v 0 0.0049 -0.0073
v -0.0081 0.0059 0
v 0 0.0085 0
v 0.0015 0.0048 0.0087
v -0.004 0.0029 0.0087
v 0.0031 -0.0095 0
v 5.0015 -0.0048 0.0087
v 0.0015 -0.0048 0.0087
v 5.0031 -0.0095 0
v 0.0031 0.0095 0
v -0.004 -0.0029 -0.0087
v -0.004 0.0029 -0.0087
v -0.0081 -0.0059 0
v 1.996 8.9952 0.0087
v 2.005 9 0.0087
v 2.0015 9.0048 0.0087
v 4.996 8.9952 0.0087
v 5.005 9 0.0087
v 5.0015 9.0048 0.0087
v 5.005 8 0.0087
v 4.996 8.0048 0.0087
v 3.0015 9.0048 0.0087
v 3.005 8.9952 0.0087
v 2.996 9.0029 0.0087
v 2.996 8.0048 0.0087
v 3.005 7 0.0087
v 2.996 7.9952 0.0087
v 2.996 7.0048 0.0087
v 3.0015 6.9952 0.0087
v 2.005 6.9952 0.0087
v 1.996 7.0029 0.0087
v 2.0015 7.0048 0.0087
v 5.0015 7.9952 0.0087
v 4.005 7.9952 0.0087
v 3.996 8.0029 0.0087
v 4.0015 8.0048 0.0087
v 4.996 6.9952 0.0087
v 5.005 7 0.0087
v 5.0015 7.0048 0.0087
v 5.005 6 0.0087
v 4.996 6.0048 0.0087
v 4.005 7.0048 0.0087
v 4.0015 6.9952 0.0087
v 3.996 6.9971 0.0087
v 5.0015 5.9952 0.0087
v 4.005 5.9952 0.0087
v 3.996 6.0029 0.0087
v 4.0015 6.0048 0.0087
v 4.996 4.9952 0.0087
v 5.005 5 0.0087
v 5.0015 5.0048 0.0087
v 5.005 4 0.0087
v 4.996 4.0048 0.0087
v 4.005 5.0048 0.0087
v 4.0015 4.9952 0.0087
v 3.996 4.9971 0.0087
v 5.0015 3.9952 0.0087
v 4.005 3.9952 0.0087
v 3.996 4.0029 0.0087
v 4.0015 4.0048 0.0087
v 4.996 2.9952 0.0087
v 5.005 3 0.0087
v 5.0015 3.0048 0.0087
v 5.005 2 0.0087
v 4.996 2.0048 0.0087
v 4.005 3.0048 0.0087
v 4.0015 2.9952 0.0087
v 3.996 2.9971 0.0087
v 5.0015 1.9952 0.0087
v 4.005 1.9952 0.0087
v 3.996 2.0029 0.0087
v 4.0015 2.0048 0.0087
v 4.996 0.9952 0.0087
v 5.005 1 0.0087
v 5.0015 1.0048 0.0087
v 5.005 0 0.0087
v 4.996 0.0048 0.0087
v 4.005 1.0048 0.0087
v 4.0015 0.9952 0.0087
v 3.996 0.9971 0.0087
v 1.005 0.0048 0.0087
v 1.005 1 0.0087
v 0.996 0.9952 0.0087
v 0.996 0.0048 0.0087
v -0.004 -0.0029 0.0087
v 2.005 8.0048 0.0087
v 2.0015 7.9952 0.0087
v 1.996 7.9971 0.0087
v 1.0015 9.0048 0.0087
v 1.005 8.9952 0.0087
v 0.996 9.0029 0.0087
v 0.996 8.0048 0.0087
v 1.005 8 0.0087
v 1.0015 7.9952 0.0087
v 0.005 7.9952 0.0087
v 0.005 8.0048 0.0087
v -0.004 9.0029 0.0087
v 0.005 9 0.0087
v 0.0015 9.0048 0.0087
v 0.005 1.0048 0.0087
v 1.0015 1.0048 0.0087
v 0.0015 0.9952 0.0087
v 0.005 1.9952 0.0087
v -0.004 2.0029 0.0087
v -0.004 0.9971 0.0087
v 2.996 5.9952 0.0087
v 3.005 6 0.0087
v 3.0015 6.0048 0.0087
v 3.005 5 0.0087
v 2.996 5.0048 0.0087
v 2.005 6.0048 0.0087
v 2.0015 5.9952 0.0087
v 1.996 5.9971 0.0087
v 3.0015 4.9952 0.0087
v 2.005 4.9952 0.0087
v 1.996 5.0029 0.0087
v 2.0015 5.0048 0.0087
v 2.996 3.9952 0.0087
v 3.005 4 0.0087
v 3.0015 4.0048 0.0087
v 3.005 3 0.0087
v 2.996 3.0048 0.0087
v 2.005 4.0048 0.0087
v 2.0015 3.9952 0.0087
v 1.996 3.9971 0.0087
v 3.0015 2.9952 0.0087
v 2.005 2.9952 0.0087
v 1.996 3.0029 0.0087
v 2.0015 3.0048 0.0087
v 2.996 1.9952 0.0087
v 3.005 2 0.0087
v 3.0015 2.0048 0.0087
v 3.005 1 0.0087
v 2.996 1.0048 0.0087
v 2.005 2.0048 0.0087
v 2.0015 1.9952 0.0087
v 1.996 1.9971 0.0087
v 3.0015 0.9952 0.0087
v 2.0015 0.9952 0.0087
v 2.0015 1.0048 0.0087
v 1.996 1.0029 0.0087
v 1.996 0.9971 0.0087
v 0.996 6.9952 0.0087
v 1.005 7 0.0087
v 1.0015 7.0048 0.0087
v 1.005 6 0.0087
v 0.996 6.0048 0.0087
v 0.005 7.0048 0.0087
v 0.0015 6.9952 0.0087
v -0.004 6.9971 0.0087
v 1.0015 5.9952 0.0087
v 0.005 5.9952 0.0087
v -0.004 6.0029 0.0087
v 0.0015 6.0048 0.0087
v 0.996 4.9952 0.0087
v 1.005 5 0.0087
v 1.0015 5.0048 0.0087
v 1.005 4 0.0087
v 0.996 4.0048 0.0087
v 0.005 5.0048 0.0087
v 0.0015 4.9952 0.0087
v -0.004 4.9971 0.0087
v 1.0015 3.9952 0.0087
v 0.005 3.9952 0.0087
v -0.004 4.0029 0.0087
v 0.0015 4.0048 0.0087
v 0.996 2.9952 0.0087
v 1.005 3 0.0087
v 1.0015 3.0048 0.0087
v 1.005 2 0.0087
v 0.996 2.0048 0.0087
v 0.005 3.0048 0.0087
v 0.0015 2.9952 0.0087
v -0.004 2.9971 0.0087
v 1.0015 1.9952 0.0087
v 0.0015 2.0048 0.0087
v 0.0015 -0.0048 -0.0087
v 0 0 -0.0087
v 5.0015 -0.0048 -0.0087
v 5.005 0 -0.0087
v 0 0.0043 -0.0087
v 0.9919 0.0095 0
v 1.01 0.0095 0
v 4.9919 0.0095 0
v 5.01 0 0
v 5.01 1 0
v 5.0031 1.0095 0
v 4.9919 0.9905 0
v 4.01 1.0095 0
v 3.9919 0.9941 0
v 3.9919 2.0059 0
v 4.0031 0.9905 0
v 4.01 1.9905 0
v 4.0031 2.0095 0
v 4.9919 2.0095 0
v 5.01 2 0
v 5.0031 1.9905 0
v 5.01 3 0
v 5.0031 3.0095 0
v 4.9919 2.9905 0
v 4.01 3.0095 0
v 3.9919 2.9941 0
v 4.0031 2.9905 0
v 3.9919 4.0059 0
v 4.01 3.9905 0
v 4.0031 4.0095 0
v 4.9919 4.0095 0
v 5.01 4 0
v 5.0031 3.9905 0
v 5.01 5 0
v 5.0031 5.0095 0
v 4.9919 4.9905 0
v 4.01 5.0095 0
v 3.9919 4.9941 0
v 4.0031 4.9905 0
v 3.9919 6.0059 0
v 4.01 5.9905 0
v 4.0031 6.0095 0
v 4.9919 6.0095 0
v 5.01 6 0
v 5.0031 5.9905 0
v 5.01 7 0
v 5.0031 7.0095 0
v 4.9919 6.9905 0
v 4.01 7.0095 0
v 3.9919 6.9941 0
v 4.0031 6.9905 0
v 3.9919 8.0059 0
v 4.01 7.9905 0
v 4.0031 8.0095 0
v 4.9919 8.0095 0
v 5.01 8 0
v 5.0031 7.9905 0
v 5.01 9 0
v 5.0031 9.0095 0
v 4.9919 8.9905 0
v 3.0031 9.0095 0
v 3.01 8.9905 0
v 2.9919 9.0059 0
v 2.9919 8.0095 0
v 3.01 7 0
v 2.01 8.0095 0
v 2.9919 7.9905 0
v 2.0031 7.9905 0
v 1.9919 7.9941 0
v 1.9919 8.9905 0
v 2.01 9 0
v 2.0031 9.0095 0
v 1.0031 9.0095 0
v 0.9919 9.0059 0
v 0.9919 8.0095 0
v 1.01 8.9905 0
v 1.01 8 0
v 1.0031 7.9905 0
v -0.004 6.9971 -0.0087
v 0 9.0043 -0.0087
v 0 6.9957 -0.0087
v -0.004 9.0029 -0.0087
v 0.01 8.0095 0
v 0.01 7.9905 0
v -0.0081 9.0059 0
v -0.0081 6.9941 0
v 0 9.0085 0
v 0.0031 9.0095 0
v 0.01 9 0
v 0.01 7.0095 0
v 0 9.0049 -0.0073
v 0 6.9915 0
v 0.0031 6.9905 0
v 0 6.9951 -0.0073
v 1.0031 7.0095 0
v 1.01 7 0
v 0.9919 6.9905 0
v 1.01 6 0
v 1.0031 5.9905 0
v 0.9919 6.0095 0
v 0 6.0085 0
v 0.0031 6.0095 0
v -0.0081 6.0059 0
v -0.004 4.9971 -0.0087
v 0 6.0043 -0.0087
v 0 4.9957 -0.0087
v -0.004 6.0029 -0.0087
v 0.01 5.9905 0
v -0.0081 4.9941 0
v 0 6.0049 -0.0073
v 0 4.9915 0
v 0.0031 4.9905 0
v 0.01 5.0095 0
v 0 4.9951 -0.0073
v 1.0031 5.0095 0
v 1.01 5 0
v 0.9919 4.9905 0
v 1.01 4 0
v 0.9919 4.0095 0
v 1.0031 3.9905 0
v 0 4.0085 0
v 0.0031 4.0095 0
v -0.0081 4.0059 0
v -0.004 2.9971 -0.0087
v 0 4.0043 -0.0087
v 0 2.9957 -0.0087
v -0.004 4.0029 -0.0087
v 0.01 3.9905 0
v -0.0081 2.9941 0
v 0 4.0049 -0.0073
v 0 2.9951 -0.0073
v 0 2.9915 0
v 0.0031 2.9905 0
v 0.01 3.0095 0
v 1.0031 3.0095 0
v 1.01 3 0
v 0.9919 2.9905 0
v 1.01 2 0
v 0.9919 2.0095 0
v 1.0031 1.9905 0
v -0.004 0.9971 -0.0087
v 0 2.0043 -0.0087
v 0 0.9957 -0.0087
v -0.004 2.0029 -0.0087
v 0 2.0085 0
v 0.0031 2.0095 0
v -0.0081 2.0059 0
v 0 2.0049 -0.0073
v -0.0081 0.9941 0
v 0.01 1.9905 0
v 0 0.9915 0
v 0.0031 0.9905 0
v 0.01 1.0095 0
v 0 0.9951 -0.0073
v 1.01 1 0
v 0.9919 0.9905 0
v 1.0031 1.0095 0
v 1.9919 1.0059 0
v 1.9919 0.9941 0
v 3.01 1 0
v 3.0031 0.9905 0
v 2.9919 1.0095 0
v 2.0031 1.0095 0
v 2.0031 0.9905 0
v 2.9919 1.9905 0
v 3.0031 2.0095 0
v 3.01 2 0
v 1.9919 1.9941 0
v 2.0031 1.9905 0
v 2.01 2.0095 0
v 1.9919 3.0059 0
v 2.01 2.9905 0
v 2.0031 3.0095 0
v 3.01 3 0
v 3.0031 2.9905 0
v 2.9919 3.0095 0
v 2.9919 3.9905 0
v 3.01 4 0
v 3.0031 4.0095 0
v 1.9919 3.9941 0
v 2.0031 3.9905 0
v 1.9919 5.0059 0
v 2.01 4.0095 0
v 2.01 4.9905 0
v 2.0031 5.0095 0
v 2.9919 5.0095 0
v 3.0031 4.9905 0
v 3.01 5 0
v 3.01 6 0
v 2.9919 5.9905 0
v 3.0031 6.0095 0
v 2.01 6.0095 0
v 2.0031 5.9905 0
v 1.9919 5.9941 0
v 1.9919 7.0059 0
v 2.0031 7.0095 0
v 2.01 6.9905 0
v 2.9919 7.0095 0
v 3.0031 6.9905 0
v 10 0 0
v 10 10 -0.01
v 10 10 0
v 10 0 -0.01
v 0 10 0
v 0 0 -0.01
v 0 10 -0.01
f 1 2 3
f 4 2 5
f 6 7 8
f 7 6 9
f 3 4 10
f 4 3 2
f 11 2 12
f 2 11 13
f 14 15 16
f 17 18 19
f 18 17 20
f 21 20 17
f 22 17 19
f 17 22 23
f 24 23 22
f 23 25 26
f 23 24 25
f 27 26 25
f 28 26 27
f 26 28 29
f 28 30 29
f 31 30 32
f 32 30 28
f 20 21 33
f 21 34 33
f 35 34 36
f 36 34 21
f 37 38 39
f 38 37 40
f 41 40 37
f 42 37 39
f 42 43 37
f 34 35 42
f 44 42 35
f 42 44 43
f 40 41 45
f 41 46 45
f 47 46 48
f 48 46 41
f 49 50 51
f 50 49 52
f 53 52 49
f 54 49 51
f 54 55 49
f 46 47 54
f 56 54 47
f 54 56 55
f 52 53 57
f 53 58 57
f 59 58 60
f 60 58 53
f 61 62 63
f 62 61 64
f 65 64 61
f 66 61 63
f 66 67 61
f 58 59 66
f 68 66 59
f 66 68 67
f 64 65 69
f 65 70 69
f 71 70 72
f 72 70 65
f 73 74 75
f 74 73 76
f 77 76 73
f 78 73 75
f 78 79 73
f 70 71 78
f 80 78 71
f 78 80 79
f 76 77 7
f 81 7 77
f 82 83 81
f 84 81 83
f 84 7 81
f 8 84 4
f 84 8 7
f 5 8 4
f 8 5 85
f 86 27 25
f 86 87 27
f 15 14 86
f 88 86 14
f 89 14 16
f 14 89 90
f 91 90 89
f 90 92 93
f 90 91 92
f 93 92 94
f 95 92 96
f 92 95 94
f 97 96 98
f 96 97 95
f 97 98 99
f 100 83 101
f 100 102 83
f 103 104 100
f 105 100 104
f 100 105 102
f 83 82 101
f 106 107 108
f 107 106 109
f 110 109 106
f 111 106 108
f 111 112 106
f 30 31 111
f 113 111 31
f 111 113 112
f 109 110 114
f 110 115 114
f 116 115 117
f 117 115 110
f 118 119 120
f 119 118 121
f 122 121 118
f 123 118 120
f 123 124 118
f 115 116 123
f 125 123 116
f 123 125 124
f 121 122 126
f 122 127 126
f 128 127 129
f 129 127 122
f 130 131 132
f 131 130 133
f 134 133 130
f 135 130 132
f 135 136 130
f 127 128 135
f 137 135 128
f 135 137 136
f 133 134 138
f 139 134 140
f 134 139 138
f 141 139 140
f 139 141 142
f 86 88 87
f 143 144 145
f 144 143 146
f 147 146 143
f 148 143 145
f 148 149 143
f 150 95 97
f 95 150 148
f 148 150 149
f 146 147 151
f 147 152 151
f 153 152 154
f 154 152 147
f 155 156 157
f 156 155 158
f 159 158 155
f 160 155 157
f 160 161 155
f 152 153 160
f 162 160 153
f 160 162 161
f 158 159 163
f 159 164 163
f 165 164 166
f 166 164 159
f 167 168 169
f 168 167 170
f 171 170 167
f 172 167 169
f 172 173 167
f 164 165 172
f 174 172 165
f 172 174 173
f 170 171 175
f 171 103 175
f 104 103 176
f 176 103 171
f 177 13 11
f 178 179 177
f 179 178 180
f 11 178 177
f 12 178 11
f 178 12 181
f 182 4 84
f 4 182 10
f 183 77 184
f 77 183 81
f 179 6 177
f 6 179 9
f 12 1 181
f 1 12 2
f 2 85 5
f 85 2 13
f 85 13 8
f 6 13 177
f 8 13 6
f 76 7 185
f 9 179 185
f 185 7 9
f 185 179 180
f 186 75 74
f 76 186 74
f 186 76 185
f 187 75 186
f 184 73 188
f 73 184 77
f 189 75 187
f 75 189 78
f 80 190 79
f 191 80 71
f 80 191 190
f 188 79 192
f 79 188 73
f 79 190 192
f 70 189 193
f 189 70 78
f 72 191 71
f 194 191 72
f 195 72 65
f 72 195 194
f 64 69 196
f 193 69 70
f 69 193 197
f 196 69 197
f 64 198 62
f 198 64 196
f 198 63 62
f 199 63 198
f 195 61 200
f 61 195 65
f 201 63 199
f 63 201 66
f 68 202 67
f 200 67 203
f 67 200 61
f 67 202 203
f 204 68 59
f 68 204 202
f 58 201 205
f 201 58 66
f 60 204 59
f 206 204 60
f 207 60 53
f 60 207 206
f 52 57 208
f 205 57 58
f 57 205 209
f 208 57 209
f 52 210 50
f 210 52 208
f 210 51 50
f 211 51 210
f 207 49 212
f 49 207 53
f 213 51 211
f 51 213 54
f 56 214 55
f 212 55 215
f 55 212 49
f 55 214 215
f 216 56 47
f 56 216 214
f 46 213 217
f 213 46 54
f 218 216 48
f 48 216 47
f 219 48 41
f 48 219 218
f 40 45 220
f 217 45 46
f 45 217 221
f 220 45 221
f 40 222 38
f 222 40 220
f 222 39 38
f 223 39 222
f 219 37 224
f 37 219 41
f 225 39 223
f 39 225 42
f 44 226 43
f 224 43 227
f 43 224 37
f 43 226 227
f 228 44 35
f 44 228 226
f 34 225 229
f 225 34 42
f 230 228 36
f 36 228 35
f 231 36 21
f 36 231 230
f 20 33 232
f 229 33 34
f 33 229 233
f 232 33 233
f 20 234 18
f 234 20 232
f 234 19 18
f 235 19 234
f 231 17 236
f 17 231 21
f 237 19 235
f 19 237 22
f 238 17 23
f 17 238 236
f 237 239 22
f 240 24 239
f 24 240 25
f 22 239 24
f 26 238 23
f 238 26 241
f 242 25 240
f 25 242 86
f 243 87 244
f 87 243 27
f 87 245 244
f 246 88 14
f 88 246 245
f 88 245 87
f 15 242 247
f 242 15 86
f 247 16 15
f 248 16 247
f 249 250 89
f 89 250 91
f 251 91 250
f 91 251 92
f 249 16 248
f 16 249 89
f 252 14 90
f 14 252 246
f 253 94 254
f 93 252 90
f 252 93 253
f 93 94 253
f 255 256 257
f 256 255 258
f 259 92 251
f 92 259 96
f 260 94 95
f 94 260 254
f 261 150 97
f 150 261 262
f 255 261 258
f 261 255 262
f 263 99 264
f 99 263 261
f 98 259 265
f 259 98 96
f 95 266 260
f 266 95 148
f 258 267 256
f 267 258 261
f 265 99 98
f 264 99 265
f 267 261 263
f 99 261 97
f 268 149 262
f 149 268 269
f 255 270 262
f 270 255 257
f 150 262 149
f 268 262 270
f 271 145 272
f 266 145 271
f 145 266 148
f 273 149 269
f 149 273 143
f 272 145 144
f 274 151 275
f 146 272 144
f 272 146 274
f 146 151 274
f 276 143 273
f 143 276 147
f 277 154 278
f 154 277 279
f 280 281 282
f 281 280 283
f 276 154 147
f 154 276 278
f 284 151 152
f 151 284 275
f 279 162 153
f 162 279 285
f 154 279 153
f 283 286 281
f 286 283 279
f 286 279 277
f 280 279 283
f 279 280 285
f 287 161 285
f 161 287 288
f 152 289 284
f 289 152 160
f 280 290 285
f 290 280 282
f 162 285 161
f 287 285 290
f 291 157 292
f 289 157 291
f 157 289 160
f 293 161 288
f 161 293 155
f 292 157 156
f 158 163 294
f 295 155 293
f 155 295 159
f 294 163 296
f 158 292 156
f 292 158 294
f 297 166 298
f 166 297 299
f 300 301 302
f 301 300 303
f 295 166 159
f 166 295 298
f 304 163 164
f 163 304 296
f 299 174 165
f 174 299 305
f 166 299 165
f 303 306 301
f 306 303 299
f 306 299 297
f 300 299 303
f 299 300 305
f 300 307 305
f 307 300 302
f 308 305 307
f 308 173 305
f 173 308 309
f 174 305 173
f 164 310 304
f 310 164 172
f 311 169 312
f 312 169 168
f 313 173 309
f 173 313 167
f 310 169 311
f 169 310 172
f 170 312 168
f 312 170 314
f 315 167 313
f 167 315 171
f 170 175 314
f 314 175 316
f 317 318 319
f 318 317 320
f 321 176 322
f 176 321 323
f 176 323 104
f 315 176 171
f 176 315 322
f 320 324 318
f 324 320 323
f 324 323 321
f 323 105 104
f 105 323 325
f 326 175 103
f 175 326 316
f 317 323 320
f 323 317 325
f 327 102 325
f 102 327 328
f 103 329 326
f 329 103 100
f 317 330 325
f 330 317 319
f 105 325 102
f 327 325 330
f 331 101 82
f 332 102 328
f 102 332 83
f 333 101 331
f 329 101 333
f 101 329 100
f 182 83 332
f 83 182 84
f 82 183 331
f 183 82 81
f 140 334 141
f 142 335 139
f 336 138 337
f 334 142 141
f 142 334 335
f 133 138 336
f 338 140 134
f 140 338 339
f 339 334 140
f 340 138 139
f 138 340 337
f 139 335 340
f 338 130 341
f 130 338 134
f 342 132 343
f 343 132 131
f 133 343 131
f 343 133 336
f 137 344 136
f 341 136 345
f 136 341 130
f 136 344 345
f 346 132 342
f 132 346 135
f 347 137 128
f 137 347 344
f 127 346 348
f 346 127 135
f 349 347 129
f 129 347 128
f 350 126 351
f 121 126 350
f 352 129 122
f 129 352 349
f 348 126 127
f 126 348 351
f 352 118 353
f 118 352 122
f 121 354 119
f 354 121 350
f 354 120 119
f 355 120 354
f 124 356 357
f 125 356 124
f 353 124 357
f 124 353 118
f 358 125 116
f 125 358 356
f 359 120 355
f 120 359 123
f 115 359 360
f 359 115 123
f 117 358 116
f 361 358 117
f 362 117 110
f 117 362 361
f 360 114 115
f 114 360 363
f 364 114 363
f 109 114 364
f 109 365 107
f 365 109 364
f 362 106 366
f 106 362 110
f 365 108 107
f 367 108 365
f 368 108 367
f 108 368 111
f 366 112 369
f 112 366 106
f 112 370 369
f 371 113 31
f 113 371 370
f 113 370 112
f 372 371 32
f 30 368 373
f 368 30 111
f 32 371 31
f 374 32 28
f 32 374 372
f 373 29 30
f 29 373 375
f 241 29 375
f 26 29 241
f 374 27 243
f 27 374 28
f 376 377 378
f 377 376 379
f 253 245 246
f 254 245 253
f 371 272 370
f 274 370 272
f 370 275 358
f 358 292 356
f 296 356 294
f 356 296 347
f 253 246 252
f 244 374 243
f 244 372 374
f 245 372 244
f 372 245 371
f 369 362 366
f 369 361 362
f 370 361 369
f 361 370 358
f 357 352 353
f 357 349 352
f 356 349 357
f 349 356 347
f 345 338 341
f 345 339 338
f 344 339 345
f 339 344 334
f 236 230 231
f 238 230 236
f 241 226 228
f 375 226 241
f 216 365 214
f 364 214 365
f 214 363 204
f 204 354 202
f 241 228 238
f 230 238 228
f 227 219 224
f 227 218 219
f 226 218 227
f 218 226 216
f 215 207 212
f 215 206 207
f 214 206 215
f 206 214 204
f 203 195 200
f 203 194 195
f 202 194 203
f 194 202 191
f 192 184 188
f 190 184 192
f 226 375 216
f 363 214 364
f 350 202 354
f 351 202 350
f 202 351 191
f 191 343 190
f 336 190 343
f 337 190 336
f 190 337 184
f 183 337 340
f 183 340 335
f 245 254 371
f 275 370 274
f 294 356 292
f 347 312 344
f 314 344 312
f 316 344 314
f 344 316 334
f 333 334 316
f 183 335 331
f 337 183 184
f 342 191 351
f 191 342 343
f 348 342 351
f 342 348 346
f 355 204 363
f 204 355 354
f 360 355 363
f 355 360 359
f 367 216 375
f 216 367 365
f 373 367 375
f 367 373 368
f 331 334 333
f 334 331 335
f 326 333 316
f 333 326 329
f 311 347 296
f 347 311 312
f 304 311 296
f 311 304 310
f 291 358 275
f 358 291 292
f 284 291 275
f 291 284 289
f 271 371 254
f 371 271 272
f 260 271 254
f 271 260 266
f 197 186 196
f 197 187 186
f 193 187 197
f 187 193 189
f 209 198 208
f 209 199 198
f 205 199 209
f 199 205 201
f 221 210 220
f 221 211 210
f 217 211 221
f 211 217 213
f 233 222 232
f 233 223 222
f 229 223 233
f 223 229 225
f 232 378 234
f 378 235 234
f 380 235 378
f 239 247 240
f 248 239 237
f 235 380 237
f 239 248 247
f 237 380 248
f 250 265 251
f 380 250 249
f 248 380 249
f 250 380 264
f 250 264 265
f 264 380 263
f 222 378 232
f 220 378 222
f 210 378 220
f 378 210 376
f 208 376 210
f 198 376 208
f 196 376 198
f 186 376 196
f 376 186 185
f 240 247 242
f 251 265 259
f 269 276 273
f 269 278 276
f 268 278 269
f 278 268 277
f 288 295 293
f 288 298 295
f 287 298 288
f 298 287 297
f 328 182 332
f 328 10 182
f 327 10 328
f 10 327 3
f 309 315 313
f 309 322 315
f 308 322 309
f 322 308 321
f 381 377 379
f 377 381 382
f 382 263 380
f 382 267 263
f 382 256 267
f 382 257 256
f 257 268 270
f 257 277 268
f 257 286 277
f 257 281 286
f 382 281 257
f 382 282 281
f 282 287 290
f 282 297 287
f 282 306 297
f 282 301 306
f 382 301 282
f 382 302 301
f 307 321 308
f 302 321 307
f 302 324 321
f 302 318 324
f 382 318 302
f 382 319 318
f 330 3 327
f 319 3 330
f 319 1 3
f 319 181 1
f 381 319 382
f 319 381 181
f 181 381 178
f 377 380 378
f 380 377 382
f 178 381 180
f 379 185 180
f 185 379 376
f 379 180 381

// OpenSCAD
hull(){
    translate([0, 0]) sphere(0.01);
    translate([1, 0]) sphere(0.01);
}
hull(){
    translate([1, 0]) sphere(0.01);
    translate([2, 0]) sphere(0.01);
}
hull(){
    translate([2, 0]) sphere(0.01);
    translate([3, 0]) sphere(0.01);
}
hull(){
    translate([3, 0]) sphere(0.01);
    translate([4, 0]) sphere(0.01);
}
hull(){
    translate([4, 0]) sphere(0.01);
    translate([5, 0]) sphere(0.01);
}
hull(){
    translate([5, 0]) sphere(0.01);
    translate([5, 1]) sphere(0.01);
}
hull(){
    translate([5, 1]) sphere(0.01);
    translate([4, 1]) sphere(0.01);
}
hull(){
    translate([4, 1]) sphere(0.01);
    translate([4, 2]) sphere(0.01);
}
hull(){
    translate([4, 2]) sphere(0.01);
    translate([5, 2]) sphere(0.01);
}
hull(){
    translate([5, 2]) sphere(0.01);
    translate([5, 3]) sphere(0.01);
}
hull(){
    translate([5, 3]) sphere(0.01);
    translate([4, 3]) sphere(0.01);
}
hull(){
    translate([4, 3]) sphere(0.01);
    translate([4, 4]) sphere(0.01);
}
hull(){
    translate([4, 4]) sphere(0.01);
    translate([5, 4]) sphere(0.01);
}
hull(){
    translate([5, 4]) sphere(0.01);
    translate([5, 5]) sphere(0.01);
}
hull(){
    translate([5, 5]) sphere(0.01);
    translate([4, 5]) sphere(0.01);
}
hull(){
    translate([4, 5]) sphere(0.01);
    translate([4, 6]) sphere(0.01);
}
hull(){
    translate([4, 6]) sphere(0.01);
    translate([5, 6]) sphere(0.01);
}
hull(){
    translate([5, 6]) sphere(0.01);
    translate([5, 7]) sphere(0.01);
}
hull(){
    translate([5, 7]) sphere(0.01);
    translate([4, 7]) sphere(0.01);
}
hull(){
    translate([4, 7]) sphere(0.01);
    translate([4, 8]) sphere(0.01);
}
hull(){
    translate([4, 8]) sphere(0.01);
    translate([5, 8]) sphere(0.01);
}
hull(){
    translate([5, 8]) sphere(0.01);
    translate([5, 9]) sphere(0.01);
}
hull(){
    translate([5, 9]) sphere(0.01);
    translate([4, 9]) sphere(0.01);
}
hull(){
    translate([4, 9]) sphere(0.01);
    translate([3, 9]) sphere(0.01);
}
hull(){
    translate([3, 9]) sphere(0.01);
    translate([3, 8]) sphere(0.01);
}
hull(){
    translate([3, 8]) sphere(0.01);
    translate([2, 8]) sphere(0.01);
}
hull(){
    translate([2, 8]) sphere(0.01);
    translate([2, 9]) sphere(0.01);
}
hull(){
    translate([2, 9]) sphere(0.01);
    translate([1, 9]) sphere(0.01);
}
hull(){
    translate([1, 9]) sphere(0.01);
    translate([1, 8]) sphere(0.01);
}
hull(){
    translate([1, 8]) sphere(0.01);
    translate([0, 8]) sphere(0.01);
}
hull(){
    translate([0, 8]) sphere(0.01);
    translate([0, 9]) sphere(0.01);
}
hull(){
    translate([0, 9]) sphere(0.01);
    translate([0, 8]) sphere(0.01);
}
hull(){
    translate([0, 8]) sphere(0.01);
    translate([0, 7]) sphere(0.01);
}
hull(){
    translate([0, 7]) sphere(0.01);
    translate([1, 7]) sphere(0.01);
}
hull(){
    translate([1, 7]) sphere(0.01);
    translate([1, 6]) sphere(0.01);
}
hull(){
    translate([1, 6]) sphere(0.01);
    translate([0, 6]) sphere(0.01);
}
hull(){
    translate([0, 6]) sphere(0.01);
    translate([0, 5]) sphere(0.01);
}
hull(){
    translate([0, 5]) sphere(0.01);
    translate([1, 5]) sphere(0.01);
}
hull(){
    translate([1, 5]) sphere(0.01);
    translate([1, 4]) sphere(0.01);
}
hull(){
    translate([1, 4]) sphere(0.01);
    translate([0, 4]) sphere(0.01);
}
hull(){
    translate([0, 4]) sphere(0.01);
    translate([0, 3]) sphere(0.01);
}
hull(){
    translate([0, 3]) sphere(0.01);
    translate([1, 3]) sphere(0.01);
}
hull(){
    translate([1, 3]) sphere(0.01);
    translate([1, 2]) sphere(0.01);
}
hull(){
    translate([1, 2]) sphere(0.01);
    translate([0, 2]) sphere(0.01);
}
hull(){
    translate([0, 2]) sphere(0.01);
    translate([0, 1]) sphere(0.01);
}
hull(){
    translate([0, 1]) sphere(0.01);
    translate([1, 1]) sphere(0.01);
}
hull(){
    translate([1, 1]) sphere(0.01);
    translate([1, 0]) sphere(0.01);
}
hull(){
    translate([1, 0]) sphere(0.01);
    translate([0, 0]) sphere(0.01);
}
hull(){
    translate([2, 1]) sphere(0.01);
    translate([3, 1]) sphere(0.01);
}
hull(){
    translate([3, 1]) sphere(0.01);
    translate([3, 2]) sphere(0.01);
}
hull(){
    translate([3, 2]) sphere(0.01);
    translate([2, 2]) sphere(0.01);
}
hull(){
    translate([2, 2]) sphere(0.01);
    translate([2, 3]) sphere(0.01);
}
hull(){
    translate([2, 3]) sphere(0.01);
    translate([3, 3]) sphere(0.01);
}
hull(){
    translate([3, 3]) sphere(0.01);
    translate([3, 4]) sphere(0.01);
}
hull(){
    translate([3, 4]) sphere(0.01);
    translate([2, 4]) sphere(0.01);
}
hull(){
    translate([2, 4]) sphere(0.01);
    translate([2, 5]) sphere(0.01);
}
hull(){
    translate([2, 5]) sphere(0.01);
    translate([3, 5]) sphere(0.01);
}
hull(){
    translate([3, 5]) sphere(0.01);
    translate([3, 6]) sphere(0.01);
}
hull(){
    translate([3, 6]) sphere(0.01);
    translate([2, 6]) sphere(0.01);
}
hull(){
    translate([2, 6]) sphere(0.01);
    translate([2, 7]) sphere(0.01);
}
hull(){
    translate([2, 7]) sphere(0.01);
    translate([3, 7]) sphere(0.01);
}
hull(){
    translate([3, 7]) sphere(0.01);
    translate([3, 8]) sphere(0.01);
}
translate([0,0,-0.01]) color([0.1,0.1,0.1]) cube([10,10,0.01]);
